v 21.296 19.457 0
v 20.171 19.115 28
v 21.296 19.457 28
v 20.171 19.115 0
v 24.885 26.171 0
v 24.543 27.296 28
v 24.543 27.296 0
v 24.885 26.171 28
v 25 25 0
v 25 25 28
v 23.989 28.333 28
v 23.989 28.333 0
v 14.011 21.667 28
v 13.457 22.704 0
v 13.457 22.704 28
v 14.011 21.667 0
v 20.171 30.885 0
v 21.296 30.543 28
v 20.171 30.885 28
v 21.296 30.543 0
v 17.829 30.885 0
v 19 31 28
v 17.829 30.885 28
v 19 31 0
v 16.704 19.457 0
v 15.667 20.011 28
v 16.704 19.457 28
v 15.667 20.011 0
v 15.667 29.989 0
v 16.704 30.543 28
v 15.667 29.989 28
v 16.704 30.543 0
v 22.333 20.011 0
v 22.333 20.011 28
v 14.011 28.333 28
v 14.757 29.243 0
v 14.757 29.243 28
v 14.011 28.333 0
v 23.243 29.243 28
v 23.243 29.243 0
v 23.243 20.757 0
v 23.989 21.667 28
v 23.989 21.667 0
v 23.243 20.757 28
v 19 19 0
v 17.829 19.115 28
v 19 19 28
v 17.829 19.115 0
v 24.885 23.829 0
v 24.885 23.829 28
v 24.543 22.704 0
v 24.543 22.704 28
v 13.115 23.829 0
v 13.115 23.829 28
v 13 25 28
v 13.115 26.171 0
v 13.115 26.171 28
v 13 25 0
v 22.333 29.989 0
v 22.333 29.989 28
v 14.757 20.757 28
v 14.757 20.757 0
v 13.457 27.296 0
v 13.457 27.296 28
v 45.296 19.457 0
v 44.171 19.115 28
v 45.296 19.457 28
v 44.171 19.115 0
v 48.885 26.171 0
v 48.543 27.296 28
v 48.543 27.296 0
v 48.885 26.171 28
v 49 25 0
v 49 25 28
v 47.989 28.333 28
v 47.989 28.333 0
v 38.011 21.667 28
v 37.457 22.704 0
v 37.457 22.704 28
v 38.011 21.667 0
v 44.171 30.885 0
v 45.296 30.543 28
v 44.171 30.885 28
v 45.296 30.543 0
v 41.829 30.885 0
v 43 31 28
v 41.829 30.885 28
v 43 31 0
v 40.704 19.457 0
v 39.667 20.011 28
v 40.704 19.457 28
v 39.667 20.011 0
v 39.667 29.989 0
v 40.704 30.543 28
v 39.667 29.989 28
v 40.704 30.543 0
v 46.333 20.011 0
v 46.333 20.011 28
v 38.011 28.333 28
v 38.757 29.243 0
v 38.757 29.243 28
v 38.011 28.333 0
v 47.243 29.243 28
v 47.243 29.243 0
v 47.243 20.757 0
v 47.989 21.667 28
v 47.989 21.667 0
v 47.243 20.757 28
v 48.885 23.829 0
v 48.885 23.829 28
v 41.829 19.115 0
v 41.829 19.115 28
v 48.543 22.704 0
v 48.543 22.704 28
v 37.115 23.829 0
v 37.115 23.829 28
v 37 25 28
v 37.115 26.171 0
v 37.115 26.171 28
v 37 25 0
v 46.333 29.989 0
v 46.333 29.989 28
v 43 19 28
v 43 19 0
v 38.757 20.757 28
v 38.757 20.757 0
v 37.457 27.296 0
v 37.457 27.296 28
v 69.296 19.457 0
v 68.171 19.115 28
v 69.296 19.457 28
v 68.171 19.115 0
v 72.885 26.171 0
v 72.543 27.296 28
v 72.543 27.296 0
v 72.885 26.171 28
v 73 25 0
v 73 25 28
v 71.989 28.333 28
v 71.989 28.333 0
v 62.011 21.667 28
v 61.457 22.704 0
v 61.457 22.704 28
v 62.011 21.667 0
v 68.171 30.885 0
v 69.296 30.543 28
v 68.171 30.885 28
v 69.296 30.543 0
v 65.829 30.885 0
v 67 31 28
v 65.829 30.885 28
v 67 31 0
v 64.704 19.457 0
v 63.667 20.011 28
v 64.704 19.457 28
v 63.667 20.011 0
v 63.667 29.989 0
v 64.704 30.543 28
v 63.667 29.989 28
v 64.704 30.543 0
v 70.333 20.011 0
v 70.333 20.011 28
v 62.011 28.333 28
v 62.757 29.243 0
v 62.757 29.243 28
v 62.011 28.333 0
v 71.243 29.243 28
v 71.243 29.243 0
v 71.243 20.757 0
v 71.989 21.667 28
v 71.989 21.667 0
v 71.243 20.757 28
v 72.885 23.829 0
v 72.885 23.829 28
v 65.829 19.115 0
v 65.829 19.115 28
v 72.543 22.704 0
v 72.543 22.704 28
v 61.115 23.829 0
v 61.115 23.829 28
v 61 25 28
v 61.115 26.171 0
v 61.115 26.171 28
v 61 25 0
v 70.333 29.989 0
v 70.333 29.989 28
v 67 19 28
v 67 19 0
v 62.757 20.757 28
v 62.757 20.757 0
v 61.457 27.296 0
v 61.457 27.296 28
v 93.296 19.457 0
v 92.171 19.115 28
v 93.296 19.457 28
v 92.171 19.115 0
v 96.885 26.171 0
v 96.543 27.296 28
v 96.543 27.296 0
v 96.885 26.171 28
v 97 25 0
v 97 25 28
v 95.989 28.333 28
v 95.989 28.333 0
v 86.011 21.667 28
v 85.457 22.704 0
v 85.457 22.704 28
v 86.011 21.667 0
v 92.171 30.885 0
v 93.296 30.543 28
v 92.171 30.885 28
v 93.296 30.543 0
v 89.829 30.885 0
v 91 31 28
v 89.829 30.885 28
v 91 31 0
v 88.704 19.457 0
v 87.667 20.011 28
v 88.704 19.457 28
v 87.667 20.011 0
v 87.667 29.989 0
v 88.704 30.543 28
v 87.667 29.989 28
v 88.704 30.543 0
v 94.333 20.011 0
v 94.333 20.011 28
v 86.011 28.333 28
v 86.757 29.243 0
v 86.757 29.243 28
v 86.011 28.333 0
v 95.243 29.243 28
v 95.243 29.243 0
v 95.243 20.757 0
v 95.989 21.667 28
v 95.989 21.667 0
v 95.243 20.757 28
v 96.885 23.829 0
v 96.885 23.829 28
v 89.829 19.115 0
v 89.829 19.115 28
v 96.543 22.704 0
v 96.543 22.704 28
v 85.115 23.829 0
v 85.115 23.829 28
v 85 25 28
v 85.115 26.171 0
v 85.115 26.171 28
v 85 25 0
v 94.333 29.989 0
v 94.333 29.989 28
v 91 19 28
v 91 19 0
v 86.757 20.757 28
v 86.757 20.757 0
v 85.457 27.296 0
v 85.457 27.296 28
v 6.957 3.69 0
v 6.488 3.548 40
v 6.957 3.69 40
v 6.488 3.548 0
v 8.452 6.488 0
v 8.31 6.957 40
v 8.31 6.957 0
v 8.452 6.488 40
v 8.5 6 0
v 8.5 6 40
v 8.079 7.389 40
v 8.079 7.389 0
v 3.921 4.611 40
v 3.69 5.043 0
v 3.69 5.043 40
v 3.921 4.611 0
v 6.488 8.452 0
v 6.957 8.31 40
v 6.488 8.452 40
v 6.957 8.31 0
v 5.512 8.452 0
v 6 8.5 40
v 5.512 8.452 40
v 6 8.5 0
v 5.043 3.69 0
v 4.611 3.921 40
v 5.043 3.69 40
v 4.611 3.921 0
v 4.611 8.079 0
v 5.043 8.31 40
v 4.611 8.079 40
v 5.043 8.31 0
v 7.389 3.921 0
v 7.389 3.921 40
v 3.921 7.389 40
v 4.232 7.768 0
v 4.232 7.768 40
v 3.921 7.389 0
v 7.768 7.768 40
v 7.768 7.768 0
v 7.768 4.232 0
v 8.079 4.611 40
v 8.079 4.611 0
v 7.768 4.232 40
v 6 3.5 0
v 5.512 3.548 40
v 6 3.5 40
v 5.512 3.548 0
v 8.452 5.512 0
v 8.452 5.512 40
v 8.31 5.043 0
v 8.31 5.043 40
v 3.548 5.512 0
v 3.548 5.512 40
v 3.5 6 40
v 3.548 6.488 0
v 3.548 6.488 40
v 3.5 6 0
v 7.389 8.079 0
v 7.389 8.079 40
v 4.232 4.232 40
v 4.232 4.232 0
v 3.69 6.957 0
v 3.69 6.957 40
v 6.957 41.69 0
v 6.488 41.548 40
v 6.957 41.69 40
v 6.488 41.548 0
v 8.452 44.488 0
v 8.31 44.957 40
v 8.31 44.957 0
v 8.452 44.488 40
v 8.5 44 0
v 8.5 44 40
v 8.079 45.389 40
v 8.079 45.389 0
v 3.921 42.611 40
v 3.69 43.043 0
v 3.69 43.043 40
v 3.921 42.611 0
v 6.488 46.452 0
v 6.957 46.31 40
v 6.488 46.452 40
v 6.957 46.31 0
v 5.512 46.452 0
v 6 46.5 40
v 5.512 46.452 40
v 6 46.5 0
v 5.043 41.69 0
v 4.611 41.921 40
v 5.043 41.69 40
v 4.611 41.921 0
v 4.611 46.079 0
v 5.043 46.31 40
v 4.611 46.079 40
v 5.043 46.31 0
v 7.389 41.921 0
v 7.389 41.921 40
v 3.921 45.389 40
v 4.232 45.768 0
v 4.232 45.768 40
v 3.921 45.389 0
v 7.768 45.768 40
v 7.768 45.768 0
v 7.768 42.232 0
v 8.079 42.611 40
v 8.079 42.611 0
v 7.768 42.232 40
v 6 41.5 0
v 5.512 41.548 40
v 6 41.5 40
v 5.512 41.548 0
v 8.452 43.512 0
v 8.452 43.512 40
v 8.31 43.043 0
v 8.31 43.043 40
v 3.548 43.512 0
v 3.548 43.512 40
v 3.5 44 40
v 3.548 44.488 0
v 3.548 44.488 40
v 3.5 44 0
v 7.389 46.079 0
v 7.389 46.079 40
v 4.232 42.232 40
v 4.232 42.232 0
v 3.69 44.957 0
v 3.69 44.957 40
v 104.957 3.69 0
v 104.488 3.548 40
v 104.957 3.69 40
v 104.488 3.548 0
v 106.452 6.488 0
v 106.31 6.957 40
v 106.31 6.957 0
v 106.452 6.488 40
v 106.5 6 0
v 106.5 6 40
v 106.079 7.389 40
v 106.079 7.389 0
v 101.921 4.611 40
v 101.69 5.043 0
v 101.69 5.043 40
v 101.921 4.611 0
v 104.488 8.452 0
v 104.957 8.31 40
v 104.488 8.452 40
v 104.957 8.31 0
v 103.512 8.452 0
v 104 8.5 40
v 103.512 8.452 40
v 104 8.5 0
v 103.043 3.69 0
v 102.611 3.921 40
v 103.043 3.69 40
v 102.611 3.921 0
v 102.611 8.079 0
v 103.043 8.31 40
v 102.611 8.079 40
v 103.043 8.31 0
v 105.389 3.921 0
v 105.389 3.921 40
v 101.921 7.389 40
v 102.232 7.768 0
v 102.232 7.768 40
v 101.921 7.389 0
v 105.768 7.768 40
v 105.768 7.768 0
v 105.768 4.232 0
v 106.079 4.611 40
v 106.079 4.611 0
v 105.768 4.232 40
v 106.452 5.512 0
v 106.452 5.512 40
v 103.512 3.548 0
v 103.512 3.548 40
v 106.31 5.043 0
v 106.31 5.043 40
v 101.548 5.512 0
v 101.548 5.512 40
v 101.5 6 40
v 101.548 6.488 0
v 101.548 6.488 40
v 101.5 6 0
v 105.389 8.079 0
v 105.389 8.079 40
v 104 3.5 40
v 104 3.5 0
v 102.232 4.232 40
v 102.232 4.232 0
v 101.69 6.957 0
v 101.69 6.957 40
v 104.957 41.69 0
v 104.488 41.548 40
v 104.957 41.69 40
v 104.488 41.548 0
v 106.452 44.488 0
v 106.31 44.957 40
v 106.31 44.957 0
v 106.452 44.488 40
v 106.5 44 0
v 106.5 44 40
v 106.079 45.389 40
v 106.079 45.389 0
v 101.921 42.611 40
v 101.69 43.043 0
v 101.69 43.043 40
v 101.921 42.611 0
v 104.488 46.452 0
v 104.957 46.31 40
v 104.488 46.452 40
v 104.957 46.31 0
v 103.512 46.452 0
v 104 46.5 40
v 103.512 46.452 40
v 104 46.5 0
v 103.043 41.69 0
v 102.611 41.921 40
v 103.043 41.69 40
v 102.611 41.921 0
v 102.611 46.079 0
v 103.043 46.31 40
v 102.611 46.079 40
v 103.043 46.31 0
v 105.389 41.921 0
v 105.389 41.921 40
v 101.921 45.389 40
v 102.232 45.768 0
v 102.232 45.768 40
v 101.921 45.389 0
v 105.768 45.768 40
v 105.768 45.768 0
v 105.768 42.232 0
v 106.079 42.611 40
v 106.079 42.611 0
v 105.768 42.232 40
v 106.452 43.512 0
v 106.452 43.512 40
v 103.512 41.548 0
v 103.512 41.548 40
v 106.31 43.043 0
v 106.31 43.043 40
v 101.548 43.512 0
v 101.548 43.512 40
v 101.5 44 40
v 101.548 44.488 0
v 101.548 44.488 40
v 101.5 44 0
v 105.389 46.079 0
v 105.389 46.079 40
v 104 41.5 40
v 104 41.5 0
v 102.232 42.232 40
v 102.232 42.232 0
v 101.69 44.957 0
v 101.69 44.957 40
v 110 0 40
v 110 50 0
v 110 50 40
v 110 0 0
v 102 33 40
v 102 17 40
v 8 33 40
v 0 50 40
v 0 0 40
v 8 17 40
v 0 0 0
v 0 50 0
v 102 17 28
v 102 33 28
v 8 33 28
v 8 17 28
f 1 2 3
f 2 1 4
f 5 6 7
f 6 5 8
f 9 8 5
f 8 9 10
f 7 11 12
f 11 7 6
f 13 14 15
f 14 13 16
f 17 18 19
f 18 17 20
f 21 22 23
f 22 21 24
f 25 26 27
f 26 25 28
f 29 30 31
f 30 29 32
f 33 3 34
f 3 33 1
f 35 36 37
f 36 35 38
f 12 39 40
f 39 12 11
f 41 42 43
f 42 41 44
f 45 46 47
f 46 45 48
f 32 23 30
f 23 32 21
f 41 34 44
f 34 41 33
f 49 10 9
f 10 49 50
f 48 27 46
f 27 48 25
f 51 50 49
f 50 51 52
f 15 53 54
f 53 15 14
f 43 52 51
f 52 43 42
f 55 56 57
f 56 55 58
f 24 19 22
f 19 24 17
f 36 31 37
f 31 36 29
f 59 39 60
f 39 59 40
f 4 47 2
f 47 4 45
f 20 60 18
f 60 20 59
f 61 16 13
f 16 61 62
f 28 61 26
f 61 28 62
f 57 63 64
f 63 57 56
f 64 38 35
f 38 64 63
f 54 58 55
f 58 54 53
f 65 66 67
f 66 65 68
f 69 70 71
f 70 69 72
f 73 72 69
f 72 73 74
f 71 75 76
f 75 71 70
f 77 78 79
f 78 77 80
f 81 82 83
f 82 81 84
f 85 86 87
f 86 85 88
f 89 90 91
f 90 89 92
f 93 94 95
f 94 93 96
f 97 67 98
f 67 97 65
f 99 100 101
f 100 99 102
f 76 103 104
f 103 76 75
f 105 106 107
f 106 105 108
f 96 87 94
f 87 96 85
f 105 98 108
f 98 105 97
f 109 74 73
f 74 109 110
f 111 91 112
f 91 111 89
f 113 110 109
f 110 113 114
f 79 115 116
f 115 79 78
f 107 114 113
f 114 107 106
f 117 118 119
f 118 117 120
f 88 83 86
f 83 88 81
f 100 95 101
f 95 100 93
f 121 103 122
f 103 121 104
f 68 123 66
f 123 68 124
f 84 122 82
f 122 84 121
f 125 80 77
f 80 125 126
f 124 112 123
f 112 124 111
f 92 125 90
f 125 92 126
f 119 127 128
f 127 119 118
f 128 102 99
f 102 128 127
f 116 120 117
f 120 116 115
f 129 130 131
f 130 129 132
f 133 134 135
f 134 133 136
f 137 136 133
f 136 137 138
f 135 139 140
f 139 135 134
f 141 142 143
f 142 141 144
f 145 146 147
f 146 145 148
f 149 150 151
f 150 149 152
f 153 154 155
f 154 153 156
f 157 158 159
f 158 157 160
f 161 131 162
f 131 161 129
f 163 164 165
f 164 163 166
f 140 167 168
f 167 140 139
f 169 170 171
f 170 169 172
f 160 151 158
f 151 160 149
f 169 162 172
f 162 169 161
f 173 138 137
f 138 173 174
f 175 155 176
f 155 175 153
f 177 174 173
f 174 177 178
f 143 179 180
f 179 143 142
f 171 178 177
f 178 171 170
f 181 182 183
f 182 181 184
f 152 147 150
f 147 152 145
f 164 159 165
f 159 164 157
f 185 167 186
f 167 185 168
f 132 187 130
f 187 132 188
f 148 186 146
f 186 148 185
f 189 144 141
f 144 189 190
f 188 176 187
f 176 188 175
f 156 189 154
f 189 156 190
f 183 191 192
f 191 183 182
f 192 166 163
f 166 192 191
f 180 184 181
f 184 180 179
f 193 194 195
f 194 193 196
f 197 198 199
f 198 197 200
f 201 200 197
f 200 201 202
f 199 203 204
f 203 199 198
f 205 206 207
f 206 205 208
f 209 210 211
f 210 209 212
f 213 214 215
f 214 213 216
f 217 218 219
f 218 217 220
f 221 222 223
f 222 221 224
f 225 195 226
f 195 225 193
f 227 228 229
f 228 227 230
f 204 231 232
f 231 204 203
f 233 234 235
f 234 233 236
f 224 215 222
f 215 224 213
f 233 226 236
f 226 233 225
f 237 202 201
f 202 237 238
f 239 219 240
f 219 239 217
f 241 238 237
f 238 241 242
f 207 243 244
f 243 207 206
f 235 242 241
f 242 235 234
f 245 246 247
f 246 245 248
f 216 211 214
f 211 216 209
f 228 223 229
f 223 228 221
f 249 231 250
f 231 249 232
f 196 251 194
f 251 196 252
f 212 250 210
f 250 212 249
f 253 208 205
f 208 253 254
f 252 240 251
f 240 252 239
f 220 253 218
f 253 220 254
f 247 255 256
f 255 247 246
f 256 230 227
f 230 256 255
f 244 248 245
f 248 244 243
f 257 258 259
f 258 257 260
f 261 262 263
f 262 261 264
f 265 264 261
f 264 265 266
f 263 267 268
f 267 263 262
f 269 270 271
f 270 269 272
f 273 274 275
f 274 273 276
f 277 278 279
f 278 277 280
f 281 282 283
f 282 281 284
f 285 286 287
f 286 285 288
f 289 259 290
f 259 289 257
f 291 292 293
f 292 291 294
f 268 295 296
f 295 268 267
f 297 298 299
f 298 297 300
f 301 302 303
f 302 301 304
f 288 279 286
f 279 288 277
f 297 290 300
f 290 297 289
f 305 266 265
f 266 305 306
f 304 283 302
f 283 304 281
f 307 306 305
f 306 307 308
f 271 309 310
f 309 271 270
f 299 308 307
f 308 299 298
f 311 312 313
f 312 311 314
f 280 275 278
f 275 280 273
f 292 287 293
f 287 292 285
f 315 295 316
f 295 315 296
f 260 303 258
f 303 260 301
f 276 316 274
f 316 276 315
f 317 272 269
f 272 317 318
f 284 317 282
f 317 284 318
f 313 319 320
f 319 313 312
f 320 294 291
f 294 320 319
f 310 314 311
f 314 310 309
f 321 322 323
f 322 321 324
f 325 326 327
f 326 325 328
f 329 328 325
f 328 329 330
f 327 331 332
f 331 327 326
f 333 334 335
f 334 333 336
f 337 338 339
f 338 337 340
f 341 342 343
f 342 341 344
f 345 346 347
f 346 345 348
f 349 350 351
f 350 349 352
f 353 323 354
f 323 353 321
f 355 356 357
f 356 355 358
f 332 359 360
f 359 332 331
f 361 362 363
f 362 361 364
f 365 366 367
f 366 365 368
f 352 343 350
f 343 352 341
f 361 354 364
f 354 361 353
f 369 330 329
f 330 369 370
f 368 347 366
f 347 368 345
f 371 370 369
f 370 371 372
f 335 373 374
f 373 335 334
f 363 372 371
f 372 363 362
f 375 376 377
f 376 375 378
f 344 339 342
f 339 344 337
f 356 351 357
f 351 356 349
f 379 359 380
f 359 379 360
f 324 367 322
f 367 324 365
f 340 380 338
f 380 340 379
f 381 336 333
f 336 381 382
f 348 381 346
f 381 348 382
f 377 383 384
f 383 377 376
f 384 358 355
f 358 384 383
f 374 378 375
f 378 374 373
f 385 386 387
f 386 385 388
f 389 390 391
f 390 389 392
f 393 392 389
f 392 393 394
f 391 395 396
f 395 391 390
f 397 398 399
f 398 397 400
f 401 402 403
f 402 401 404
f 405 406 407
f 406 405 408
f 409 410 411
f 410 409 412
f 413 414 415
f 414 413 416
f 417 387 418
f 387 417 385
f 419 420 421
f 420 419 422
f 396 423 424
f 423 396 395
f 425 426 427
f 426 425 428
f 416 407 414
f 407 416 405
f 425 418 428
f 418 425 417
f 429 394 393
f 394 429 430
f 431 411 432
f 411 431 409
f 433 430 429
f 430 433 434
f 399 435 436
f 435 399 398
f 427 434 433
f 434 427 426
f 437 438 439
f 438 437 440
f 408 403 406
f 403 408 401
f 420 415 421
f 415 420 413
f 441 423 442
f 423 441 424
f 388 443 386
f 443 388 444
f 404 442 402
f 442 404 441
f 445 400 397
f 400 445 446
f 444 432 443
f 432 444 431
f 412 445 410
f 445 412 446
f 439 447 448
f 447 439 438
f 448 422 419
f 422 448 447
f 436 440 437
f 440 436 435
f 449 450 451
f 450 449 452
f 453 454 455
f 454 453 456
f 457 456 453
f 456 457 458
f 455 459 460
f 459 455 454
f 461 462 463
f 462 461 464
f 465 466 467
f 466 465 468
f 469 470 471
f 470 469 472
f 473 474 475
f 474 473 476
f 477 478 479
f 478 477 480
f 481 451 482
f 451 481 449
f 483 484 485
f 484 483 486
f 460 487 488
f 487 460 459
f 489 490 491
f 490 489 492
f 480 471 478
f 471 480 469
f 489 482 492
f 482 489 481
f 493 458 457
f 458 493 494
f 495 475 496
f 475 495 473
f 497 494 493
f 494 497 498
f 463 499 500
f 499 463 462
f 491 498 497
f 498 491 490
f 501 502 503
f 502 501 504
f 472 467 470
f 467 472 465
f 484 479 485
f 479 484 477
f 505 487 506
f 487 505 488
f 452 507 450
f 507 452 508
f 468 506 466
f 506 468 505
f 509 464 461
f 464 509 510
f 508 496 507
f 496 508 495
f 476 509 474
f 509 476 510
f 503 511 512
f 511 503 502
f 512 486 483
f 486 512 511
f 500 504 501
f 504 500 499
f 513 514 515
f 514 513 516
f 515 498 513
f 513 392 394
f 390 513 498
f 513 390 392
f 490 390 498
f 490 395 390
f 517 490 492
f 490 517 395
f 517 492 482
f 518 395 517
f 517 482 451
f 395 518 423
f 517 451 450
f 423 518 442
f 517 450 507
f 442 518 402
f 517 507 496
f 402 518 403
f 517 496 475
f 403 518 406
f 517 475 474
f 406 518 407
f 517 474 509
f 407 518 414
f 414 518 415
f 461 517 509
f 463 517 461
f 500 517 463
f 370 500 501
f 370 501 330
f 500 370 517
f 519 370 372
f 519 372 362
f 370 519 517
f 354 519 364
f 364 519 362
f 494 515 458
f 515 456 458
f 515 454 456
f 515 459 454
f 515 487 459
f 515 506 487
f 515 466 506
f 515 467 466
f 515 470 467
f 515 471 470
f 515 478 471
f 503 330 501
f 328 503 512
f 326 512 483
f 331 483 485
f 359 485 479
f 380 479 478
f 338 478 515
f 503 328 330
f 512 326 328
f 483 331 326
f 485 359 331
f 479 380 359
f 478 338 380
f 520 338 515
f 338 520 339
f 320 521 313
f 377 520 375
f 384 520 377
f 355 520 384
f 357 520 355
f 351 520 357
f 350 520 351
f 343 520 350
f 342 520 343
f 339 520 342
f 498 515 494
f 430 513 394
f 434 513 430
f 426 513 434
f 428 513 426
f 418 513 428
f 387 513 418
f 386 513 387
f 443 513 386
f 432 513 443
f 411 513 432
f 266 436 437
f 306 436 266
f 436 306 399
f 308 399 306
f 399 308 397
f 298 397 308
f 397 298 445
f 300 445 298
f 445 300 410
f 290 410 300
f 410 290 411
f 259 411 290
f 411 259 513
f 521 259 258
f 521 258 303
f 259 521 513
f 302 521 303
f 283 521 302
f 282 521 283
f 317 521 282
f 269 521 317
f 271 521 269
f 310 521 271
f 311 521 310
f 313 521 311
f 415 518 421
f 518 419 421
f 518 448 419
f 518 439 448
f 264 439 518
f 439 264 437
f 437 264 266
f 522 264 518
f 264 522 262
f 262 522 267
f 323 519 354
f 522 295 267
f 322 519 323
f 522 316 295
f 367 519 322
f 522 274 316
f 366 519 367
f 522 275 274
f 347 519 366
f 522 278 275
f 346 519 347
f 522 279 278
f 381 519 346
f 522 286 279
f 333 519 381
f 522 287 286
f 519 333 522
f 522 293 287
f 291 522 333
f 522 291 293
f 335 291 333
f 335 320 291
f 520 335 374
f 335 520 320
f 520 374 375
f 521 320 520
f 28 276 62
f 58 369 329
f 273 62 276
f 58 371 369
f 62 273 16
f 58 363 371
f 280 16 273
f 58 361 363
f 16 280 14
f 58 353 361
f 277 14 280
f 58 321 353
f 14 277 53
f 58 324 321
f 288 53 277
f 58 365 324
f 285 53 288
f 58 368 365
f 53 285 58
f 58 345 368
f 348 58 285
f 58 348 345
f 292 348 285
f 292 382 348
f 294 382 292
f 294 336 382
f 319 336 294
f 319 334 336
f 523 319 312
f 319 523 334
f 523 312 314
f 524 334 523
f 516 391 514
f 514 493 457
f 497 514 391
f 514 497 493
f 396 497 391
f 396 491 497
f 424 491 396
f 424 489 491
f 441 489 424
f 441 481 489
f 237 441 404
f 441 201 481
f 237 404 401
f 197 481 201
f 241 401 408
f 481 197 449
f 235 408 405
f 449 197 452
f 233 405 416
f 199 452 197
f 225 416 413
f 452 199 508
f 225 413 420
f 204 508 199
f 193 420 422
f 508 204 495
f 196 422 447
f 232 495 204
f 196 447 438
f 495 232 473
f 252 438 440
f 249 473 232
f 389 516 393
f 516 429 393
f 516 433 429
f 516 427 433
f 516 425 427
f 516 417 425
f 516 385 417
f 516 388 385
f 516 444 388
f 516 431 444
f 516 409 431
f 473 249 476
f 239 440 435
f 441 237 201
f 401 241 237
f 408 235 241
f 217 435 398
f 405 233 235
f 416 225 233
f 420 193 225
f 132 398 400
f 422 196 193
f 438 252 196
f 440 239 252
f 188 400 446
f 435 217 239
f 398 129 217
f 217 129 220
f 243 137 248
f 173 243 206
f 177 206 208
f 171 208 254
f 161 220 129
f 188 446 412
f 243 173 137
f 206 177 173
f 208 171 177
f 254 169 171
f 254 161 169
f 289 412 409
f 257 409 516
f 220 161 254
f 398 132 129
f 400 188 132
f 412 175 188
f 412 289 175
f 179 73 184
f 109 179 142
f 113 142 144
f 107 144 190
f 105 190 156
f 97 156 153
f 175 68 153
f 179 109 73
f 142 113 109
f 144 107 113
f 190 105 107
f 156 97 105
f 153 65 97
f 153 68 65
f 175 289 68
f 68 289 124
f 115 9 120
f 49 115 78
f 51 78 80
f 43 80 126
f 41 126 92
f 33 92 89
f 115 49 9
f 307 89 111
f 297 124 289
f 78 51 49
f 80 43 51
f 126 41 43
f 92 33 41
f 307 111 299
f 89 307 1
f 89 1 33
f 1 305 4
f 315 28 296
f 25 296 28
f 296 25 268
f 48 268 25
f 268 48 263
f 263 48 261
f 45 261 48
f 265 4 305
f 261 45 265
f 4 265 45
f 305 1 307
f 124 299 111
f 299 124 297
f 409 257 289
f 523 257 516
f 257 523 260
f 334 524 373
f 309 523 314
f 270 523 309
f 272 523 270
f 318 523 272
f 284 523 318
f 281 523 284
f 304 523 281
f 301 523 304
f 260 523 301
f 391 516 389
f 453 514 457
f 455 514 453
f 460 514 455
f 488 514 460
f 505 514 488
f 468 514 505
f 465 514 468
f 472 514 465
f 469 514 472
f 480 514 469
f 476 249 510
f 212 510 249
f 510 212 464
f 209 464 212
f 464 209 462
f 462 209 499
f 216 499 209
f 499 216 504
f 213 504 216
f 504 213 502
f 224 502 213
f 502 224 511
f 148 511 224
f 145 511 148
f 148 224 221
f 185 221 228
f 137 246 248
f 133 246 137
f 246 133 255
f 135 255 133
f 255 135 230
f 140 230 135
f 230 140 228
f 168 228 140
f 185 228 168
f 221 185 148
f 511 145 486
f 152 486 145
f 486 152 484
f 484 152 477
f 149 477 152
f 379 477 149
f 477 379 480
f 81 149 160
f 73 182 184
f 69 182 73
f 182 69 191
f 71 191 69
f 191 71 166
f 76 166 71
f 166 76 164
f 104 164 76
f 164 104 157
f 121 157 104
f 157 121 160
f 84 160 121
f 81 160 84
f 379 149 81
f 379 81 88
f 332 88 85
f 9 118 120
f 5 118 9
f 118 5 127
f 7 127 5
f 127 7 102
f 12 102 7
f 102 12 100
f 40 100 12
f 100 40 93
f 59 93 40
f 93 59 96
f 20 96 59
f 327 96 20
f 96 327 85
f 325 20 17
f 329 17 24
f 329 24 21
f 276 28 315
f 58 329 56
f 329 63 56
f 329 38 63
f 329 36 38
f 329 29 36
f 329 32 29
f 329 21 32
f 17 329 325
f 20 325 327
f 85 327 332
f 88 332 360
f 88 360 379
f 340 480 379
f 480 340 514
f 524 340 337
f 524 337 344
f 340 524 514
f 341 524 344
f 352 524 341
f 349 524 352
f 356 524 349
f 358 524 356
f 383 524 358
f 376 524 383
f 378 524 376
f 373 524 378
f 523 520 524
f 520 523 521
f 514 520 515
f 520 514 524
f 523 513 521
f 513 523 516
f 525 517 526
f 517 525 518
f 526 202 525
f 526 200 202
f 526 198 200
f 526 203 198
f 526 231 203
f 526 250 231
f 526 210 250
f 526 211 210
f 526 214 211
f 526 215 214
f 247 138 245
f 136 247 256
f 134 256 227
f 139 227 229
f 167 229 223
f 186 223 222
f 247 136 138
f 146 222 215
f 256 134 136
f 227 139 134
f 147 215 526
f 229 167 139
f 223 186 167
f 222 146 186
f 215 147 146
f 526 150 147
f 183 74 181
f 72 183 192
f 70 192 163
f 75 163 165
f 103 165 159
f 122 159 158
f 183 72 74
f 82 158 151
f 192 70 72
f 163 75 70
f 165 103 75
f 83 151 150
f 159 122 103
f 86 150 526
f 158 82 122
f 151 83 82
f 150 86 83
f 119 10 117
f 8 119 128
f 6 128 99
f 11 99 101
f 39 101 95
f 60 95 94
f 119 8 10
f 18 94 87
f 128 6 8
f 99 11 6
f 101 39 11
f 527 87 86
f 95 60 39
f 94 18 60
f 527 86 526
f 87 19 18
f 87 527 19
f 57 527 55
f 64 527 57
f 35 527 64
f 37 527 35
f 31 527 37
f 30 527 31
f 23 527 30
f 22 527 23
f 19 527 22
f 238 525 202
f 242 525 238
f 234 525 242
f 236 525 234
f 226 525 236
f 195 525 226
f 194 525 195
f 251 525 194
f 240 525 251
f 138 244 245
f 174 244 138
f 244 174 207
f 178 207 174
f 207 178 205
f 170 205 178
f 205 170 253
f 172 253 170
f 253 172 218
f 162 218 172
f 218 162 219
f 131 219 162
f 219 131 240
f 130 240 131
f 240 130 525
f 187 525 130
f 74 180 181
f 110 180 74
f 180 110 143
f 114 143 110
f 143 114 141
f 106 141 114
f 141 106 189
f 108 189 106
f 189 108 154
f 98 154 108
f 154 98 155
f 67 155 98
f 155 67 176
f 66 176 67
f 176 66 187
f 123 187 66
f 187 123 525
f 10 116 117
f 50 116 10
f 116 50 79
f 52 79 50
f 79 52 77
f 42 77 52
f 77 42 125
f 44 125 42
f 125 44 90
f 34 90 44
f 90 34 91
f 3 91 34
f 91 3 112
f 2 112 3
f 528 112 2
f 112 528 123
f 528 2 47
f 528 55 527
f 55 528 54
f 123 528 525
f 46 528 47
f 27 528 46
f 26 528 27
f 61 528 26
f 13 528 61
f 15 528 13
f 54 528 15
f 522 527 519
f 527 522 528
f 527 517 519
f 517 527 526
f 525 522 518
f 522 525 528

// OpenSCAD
$fn = 32;

// ----------------------------------------------------------------------
// Manifold block: gallery_top manifold
// ----------------------------------------------------------------------

// --- parameters (mm) ---
block_l = 110;            // block length, X
block_w = 50;             // block width, Y
block_h = 40;             // block height, Z
port_d = 12;              // port bore diameter
port_pitch = 24;          // port pitch along X
gallery_d = 16;           // top gallery width, Y
gallery_depth = 12;       // gallery pocket depth
wall_p = 8;               // gallery end wall thickness, X
mnt_d = 5;                // mounting hole diameter
mnt_in = 6;               // mounting hole inset from the edges

n_ports = 4;  // ports in the row
port_x0 = (block_l - (n_ports - 1) * port_pitch) / 2;  // first port X

difference() {
  cube([block_l, block_w, block_h]);
  for (i = [0 : n_ports - 1])
    translate([port_x0 + i * port_pitch, block_w / 2, -1])
      cylinder(h = block_h + 2, d = port_d);
  translate([wall_p, block_w / 2 - gallery_d / 2, block_h - gallery_depth])
    cube([block_l - 2 * wall_p, gallery_d, gallery_depth + 1]);
  for (cx = [mnt_in, block_l - mnt_in])
    for (cy = [mnt_in, block_w - mnt_in])
      translate([cx, cy, -1]) cylinder(h = block_h + 2, d = mnt_d);
}
